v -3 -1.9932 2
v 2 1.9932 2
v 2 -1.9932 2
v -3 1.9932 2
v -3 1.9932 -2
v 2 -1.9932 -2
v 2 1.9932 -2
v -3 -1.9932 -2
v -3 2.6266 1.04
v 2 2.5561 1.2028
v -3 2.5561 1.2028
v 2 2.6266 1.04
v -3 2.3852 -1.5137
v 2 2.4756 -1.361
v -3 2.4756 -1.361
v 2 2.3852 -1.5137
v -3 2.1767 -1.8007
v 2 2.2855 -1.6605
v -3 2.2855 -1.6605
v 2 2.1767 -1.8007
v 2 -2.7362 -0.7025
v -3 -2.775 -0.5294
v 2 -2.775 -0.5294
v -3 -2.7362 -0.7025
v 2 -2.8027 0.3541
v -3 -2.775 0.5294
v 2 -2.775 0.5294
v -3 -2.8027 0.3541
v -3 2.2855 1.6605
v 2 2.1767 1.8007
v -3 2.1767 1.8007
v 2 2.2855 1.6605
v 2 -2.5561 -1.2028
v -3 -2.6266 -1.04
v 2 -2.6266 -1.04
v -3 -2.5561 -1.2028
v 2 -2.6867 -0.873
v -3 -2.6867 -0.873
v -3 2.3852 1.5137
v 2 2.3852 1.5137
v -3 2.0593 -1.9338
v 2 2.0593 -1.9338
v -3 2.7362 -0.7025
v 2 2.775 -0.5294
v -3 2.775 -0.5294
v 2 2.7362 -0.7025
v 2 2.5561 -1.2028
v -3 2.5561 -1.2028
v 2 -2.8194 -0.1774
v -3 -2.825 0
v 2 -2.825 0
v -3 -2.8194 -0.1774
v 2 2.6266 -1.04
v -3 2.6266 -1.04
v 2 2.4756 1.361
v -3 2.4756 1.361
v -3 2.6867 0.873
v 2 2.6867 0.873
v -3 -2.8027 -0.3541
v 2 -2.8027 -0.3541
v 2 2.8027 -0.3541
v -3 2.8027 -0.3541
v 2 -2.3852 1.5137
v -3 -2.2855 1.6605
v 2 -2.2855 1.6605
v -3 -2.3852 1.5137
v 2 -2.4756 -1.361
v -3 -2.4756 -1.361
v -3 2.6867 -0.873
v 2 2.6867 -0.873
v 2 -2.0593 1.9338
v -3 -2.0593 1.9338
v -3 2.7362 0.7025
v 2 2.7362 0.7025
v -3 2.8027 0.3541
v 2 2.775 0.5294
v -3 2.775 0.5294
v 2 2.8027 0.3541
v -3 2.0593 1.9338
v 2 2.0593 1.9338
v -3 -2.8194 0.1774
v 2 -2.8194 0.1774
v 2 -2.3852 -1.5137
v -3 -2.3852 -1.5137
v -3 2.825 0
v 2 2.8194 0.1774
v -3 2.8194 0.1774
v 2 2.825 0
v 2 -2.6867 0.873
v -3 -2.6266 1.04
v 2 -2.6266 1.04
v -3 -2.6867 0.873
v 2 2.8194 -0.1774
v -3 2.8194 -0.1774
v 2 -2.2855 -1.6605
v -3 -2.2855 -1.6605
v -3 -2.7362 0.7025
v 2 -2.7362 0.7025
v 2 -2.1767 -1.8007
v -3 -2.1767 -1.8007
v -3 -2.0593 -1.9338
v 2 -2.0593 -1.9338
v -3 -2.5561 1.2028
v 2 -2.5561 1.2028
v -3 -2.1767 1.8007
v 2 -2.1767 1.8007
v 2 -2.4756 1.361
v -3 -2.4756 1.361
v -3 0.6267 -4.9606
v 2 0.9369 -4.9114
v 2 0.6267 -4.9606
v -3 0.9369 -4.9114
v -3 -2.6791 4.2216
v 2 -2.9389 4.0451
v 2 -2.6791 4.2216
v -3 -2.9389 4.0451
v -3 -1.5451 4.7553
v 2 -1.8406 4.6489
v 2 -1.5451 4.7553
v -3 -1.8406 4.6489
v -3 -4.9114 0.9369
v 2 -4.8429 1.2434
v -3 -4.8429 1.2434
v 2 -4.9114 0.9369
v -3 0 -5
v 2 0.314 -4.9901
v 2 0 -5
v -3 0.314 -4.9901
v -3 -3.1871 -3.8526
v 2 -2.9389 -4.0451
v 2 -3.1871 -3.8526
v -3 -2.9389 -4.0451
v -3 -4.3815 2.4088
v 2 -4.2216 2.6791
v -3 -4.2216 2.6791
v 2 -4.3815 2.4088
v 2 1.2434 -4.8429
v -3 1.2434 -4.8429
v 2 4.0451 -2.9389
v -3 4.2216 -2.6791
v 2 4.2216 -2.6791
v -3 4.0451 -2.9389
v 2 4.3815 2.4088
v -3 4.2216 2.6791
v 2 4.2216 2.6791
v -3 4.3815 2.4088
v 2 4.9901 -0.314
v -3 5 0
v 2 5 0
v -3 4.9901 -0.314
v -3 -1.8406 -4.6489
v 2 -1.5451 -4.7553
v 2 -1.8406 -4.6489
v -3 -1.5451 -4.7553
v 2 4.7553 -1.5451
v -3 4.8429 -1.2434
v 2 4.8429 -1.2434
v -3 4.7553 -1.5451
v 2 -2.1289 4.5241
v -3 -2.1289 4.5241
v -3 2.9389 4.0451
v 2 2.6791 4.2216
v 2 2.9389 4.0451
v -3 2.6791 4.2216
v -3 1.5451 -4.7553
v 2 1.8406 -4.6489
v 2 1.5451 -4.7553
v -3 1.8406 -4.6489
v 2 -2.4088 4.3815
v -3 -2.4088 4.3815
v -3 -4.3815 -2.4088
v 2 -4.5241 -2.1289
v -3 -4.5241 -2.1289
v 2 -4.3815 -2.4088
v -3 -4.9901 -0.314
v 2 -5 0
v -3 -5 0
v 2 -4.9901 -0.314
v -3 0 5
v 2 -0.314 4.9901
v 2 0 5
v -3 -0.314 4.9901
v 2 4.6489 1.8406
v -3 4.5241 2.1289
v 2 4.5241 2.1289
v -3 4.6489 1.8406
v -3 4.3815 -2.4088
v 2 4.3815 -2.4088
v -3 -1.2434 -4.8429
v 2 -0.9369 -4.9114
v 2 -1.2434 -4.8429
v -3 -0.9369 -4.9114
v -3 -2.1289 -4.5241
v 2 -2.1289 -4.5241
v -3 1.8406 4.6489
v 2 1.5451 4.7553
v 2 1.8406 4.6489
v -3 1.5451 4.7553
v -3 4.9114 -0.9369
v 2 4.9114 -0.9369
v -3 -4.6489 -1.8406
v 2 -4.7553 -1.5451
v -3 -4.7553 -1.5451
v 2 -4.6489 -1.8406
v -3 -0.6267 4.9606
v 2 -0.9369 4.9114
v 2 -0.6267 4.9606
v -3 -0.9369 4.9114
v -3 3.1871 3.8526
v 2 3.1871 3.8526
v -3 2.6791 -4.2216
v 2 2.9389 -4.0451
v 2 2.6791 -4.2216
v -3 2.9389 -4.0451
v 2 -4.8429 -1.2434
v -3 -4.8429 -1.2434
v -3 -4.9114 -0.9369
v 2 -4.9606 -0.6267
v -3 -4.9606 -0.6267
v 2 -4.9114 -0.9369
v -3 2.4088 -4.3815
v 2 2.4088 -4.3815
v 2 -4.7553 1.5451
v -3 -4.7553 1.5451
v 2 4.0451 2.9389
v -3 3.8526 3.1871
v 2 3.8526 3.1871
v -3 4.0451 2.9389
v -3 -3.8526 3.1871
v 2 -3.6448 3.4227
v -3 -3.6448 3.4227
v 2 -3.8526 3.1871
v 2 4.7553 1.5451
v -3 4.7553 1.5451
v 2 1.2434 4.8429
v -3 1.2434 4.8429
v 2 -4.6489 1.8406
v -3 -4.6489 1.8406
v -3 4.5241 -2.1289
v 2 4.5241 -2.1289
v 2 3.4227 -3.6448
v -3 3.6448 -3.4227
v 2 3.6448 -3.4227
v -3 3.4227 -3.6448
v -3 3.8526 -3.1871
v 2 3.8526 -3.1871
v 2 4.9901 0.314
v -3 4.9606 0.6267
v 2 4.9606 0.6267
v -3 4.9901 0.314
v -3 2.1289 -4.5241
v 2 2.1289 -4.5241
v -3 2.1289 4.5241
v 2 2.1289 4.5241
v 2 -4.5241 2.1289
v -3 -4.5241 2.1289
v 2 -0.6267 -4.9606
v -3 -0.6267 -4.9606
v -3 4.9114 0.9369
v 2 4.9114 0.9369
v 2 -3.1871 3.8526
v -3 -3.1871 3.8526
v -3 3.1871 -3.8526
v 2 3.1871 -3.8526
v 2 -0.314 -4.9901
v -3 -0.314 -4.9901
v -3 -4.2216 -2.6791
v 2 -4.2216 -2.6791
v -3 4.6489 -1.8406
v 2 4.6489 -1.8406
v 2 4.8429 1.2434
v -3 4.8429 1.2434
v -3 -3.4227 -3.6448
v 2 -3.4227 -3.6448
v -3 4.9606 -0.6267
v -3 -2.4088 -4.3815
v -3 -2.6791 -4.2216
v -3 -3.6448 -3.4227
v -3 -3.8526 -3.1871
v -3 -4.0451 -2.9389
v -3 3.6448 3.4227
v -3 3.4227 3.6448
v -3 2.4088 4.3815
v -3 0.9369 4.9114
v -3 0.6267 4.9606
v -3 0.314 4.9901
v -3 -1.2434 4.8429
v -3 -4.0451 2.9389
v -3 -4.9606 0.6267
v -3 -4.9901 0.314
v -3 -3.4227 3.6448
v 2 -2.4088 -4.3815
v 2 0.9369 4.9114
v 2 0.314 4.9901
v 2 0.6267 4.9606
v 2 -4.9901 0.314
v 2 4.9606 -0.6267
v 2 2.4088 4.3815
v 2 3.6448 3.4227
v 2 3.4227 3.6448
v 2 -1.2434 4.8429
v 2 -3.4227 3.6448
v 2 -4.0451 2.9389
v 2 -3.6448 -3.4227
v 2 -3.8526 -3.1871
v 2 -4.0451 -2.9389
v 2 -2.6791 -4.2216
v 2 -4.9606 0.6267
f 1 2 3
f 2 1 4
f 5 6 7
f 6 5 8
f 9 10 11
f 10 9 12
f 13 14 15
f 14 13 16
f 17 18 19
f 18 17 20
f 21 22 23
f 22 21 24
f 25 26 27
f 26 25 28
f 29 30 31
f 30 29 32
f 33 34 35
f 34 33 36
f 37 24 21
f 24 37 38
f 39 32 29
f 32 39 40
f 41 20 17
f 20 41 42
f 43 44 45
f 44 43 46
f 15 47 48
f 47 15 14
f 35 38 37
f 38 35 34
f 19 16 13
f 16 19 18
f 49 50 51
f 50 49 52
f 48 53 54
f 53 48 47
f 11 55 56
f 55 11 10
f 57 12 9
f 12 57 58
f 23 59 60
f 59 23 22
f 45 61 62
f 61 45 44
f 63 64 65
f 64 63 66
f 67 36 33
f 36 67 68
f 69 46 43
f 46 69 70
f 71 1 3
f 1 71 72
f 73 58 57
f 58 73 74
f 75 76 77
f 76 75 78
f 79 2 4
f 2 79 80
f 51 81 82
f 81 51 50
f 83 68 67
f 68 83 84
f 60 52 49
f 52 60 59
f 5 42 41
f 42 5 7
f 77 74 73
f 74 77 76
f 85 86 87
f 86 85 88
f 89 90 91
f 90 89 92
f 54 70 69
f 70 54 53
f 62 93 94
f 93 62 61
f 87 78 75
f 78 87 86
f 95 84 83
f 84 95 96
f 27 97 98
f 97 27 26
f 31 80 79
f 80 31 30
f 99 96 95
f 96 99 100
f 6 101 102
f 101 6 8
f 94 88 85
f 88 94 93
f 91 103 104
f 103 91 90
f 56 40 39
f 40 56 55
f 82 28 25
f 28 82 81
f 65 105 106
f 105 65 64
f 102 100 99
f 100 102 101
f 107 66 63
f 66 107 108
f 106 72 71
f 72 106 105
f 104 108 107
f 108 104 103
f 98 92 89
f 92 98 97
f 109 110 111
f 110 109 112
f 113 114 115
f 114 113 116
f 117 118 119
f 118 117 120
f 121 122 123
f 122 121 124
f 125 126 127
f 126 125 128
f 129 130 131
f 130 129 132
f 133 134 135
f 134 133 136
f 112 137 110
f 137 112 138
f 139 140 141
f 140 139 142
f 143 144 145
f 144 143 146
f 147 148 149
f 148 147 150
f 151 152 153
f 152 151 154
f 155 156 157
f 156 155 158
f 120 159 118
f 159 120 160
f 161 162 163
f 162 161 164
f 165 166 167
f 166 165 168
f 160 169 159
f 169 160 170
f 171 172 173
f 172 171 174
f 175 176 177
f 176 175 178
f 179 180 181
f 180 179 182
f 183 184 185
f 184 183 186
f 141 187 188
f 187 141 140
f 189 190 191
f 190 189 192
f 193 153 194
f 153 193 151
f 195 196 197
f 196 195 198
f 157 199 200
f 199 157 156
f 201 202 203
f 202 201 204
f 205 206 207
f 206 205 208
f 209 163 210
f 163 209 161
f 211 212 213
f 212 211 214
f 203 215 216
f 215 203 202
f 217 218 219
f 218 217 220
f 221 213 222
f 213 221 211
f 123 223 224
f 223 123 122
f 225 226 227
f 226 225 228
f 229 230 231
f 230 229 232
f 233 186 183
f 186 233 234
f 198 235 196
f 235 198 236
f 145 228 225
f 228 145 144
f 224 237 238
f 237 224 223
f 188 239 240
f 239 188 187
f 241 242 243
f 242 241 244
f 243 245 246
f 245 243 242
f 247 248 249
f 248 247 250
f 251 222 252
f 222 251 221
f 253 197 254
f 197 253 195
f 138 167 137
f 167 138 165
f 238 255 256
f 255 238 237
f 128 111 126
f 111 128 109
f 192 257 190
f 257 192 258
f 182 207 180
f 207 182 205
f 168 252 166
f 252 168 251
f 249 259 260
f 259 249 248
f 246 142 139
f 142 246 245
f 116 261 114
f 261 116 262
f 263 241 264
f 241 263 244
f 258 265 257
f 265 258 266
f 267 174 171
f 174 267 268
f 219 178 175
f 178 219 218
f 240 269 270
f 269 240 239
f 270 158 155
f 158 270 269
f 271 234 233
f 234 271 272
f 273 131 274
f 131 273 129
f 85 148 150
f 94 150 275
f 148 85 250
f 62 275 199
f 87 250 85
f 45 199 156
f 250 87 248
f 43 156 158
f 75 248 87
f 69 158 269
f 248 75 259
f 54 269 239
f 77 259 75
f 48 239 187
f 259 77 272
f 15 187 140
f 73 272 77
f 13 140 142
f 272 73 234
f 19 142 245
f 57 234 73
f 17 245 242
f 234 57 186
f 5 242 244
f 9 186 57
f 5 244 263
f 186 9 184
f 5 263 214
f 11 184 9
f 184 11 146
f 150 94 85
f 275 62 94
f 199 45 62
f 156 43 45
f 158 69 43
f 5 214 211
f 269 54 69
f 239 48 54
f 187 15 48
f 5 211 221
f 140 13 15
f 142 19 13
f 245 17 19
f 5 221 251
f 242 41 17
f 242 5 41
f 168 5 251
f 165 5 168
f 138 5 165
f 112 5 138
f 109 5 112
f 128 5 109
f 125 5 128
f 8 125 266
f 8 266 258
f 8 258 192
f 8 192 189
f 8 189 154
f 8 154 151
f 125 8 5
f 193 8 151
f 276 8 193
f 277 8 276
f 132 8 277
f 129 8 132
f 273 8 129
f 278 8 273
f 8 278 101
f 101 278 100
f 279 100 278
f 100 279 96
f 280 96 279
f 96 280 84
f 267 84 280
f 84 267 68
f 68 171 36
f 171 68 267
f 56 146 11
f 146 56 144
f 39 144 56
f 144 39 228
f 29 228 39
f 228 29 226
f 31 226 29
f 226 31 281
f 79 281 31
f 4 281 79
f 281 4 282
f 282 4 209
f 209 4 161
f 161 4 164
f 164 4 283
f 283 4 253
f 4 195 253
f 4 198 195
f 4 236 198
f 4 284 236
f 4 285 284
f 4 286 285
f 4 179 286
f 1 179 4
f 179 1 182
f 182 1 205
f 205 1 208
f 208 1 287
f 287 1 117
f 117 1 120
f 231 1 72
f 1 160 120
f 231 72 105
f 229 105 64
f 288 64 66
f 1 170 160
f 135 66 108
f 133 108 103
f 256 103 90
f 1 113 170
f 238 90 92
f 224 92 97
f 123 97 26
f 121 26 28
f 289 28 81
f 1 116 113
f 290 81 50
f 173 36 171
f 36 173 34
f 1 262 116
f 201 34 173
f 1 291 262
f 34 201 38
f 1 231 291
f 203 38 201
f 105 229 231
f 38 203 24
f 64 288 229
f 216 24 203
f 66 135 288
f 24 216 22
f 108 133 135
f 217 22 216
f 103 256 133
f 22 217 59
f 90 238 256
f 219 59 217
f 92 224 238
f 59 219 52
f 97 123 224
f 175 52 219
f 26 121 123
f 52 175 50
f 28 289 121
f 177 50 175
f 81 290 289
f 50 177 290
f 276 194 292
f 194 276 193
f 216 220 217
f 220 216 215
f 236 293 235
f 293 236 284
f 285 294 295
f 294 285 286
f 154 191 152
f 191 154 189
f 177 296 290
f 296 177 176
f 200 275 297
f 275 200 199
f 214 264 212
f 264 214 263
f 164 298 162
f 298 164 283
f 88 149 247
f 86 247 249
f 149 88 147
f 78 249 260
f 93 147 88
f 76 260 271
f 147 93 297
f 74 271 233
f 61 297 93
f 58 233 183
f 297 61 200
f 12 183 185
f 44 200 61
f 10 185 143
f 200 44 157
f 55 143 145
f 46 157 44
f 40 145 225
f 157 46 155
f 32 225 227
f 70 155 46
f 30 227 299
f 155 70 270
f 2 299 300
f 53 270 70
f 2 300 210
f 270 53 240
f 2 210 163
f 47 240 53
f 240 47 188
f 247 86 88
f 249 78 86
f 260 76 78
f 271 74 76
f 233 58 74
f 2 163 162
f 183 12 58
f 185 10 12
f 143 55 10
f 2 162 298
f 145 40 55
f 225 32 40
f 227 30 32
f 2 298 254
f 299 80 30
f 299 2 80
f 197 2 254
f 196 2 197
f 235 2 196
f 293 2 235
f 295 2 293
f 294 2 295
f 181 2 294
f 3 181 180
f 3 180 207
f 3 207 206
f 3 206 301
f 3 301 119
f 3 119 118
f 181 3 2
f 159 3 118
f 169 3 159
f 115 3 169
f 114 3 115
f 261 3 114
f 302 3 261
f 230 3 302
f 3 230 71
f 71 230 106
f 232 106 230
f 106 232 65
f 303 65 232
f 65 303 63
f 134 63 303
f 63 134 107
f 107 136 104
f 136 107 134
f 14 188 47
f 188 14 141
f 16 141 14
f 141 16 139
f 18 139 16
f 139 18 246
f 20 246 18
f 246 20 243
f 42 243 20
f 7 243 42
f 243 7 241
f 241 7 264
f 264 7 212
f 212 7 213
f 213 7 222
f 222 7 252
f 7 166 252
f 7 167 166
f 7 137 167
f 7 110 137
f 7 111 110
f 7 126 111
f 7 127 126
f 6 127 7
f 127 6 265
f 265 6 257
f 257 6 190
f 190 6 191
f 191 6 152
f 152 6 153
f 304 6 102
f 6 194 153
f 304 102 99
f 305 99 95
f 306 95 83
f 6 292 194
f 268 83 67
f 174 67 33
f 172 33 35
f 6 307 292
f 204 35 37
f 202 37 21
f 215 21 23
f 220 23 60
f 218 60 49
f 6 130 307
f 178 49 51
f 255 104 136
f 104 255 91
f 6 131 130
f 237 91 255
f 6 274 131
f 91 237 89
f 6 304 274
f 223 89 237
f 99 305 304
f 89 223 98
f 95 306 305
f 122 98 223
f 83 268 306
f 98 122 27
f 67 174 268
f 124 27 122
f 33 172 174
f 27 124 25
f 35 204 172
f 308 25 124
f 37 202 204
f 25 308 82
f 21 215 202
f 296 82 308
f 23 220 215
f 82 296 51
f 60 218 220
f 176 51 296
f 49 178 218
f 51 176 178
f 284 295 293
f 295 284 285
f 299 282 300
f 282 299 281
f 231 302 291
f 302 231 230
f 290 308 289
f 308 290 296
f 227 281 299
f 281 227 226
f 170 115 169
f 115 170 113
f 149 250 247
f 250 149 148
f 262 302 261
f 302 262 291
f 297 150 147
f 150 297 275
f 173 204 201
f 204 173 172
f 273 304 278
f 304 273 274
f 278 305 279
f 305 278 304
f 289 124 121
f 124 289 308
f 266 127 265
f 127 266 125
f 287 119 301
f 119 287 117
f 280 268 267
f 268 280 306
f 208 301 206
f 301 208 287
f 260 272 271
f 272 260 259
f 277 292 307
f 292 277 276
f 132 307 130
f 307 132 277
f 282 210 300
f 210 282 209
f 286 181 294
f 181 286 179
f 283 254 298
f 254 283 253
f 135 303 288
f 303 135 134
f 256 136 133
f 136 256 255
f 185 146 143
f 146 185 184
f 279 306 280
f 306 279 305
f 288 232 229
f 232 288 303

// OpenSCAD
$fn=100;

module wheel_spacer(){
     difference(){
	 #translate([-3,0,0])rotate([0,90,0])cylinder(d=10,h=5);
	 axe();
     }
}

module axe(){
 color("white") union(){
            intersection(){
                cube([8.9, 5.65, 4], center = true);
                rotate([0, 90, 0]) cylinder(h=8.9, d=5.65, center = true);
            }
            
            translate([(8.9-0.5)/2, 0, 0]) rotate([0, 90, 0]) cylinder(h=0.5, d=5.35, center = true);
        }
}

wheel_spacer();	  
